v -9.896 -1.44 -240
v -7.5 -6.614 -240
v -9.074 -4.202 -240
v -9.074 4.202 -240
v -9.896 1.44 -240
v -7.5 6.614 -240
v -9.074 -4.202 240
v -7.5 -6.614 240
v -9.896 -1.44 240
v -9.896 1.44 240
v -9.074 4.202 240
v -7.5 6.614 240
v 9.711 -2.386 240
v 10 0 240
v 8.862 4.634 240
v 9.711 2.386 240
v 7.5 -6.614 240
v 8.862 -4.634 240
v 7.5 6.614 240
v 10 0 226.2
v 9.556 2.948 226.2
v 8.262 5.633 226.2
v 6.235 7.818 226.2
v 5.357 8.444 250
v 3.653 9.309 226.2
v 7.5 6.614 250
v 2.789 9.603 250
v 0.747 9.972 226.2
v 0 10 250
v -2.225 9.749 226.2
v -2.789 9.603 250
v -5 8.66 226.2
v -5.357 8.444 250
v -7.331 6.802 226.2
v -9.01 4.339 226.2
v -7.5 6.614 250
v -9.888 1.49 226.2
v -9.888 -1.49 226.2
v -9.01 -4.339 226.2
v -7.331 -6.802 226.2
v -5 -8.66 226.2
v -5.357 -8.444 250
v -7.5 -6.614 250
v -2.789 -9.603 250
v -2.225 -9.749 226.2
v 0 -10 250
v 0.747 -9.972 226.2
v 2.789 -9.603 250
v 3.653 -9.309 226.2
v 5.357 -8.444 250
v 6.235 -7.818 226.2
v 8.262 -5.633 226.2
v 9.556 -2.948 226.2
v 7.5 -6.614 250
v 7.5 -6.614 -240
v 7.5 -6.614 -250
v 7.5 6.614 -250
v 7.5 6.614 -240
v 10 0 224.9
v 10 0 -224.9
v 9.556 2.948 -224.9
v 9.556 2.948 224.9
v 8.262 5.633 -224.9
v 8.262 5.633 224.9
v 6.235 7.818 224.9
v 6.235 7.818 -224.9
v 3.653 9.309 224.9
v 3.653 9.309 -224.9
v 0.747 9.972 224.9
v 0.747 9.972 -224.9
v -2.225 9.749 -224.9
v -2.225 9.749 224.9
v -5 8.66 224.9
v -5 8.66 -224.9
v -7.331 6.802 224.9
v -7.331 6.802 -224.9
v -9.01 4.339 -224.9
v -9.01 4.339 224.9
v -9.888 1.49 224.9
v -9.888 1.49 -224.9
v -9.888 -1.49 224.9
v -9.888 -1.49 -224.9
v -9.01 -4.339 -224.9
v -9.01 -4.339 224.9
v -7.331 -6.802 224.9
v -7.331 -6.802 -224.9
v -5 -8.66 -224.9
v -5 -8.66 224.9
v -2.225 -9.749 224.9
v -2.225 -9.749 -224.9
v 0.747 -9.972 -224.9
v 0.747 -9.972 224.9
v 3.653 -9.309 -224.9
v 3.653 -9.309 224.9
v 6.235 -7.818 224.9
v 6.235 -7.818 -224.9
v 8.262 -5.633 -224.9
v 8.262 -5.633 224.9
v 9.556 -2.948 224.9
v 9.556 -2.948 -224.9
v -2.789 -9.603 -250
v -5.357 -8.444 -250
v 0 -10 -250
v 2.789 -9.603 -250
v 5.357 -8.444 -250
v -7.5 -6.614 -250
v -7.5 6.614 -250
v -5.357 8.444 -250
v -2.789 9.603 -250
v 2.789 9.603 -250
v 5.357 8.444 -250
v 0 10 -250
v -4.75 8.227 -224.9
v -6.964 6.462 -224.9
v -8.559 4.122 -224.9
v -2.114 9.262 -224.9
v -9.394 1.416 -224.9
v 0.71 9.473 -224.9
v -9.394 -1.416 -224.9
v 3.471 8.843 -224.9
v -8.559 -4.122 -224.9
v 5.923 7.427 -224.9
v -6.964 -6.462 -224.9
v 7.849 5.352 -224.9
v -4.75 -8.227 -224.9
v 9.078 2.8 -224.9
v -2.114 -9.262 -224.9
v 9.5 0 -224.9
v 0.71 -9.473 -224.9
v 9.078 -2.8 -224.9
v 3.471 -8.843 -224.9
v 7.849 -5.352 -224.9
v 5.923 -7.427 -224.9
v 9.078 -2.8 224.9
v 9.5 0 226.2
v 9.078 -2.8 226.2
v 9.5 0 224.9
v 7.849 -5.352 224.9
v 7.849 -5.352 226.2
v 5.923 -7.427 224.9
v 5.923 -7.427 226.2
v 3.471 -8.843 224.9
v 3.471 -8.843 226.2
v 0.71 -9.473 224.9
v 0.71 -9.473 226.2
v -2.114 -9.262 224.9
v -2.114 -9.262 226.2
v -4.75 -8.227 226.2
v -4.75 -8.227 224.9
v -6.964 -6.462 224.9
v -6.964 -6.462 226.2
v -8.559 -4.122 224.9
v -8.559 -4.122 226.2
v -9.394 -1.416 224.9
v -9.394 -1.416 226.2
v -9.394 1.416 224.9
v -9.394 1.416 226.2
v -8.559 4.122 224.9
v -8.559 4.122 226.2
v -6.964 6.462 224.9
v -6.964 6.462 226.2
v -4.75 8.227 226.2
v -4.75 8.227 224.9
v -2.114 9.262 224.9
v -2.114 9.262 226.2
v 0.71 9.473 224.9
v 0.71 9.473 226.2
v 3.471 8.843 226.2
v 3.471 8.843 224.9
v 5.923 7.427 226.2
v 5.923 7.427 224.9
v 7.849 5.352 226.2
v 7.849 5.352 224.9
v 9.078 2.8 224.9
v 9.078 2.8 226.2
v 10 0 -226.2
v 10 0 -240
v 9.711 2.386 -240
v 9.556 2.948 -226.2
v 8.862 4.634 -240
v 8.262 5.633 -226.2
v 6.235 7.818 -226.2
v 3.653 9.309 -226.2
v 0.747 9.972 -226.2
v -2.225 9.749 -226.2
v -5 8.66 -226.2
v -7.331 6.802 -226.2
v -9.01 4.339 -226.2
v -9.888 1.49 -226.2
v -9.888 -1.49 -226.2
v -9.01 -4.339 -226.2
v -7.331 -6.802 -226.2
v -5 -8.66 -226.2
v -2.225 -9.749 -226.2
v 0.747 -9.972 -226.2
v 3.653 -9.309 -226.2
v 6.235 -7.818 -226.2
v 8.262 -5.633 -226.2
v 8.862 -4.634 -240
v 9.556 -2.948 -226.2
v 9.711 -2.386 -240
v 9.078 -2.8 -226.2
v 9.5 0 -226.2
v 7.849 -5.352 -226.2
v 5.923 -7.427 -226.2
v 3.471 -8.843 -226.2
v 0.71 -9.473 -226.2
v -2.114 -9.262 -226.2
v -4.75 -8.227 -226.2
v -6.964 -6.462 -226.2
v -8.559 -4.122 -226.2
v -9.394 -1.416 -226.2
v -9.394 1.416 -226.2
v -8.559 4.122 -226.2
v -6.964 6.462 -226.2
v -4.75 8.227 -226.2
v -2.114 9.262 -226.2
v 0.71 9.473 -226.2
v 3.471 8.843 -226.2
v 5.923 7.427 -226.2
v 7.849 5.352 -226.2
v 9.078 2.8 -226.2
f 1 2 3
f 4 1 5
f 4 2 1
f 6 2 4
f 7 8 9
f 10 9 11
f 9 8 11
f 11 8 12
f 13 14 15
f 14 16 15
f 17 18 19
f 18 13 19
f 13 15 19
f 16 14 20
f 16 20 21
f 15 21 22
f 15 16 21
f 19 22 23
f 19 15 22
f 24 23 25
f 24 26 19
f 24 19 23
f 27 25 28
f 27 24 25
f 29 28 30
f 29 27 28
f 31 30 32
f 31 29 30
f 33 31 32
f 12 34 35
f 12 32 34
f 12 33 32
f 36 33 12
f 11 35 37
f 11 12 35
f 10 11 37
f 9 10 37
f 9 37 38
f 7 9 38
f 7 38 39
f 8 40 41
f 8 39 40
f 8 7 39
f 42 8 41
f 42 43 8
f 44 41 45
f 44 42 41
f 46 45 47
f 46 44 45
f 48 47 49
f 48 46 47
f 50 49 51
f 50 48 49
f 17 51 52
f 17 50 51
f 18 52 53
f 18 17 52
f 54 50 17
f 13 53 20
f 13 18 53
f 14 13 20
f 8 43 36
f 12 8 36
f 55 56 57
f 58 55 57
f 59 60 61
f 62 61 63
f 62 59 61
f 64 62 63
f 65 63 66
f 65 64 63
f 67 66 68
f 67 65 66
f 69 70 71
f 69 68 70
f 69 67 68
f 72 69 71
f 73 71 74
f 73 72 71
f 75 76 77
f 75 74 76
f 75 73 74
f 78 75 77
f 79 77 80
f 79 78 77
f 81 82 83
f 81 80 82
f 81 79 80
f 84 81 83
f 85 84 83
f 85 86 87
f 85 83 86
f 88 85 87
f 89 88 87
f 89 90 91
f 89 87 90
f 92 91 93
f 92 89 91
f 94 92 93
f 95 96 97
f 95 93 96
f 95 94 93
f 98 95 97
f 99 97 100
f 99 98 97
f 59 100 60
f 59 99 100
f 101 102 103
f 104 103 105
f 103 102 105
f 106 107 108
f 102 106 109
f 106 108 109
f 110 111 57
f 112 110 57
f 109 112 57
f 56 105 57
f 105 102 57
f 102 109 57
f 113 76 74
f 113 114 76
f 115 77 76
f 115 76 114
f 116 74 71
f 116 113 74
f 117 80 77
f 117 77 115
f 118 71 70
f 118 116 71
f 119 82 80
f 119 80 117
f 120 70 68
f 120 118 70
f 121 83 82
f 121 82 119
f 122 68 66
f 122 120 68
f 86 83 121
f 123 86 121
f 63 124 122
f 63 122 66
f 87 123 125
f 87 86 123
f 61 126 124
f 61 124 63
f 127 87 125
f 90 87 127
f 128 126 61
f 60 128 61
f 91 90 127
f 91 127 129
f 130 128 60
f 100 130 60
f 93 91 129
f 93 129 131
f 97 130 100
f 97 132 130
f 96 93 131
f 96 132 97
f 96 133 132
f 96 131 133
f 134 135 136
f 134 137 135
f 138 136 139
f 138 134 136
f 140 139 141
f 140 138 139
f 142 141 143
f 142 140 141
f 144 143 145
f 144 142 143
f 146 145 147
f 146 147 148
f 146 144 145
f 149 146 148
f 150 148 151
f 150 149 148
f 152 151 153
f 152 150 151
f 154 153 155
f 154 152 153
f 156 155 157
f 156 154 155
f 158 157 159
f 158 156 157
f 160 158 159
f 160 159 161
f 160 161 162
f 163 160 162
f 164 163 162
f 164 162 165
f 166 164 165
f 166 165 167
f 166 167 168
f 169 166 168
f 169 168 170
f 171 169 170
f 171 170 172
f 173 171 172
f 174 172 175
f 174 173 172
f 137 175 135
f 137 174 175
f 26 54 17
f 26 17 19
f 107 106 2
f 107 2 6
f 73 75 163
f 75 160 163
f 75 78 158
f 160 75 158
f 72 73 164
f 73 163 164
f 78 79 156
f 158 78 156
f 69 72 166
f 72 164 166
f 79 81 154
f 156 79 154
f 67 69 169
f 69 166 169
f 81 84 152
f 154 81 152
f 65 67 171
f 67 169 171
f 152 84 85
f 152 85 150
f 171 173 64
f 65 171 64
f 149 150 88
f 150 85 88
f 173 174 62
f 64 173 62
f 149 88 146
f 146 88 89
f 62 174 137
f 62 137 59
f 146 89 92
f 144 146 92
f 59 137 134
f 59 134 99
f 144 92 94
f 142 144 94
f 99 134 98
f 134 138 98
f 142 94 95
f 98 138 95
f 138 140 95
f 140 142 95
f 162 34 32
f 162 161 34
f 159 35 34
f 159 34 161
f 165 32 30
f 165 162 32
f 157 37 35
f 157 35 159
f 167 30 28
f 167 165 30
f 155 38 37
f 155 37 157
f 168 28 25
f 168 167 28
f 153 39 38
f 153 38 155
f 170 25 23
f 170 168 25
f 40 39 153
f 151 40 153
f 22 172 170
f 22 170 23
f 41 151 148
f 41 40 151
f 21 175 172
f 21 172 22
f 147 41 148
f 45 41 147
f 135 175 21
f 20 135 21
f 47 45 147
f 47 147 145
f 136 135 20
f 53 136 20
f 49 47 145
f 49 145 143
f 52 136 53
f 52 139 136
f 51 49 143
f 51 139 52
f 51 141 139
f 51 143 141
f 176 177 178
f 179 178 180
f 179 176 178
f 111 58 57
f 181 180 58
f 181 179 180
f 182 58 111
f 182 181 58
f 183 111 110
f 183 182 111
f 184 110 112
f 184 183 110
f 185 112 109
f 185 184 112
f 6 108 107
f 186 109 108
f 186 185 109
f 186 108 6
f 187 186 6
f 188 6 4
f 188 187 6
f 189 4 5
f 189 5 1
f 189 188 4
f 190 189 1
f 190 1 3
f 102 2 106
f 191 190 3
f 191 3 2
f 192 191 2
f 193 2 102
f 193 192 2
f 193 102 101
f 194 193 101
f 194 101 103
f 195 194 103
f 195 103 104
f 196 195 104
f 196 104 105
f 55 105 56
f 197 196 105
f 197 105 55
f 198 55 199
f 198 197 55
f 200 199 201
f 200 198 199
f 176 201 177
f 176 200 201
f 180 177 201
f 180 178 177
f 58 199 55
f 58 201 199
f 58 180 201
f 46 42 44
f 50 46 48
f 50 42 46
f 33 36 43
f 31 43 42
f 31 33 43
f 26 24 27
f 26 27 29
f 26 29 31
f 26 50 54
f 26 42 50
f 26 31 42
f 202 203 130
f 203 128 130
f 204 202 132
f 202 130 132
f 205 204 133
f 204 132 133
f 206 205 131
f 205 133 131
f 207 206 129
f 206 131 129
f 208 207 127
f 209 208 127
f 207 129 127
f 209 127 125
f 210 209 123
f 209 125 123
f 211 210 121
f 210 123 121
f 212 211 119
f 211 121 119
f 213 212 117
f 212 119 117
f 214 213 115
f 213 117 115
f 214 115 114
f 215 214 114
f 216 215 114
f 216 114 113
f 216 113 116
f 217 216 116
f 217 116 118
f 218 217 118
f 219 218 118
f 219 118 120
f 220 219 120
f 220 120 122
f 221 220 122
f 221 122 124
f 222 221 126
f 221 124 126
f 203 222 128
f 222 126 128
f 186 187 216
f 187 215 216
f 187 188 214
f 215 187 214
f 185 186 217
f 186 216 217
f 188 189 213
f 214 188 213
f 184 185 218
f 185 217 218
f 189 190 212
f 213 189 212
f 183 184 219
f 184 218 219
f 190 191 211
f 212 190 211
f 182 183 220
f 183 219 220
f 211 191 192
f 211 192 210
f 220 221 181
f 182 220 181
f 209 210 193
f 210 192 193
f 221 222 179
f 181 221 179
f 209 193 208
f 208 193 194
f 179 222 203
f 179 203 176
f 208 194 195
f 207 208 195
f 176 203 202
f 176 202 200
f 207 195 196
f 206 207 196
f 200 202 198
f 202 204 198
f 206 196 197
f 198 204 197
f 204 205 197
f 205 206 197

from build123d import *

# Parameters (mm, degrees)
SKETCH_1_R           = 10
EXTRUDE_1_DEPTH      = 250
SKETCH_3_W           = 1.3
SKETCH_3_H           = 0.5
SKETCH_4_OUTSIDE_W   = 122.16
SKETCH_4_OUTSIDE_H   = 122.16
SKETCH_4_OUTSIDE_W_2 = 15
SKETCH_4_OUTSIDE_H_2 = 51.001115416
CUT_EXTRUDE_1_DEPTH  = 10


with BuildPart() as part:
    # 草图1 → 凸台-拉伸1 (new, symmetric)
    with BuildSketch(Plane.XY):
        Circle(SKETCH_1_R)
    extrude(amount=EXTRUDE_1_DEPTH, both=True)

    # 草图3 → 切除-旋转1 (revolve, cut)
    with BuildSketch(Plane(origin=(100, 0, 250), x_dir=(0, 0, -1), z_dir=(0, 1, 0))):
        with Locations((24.45, 90.25)):
            Rectangle(SKETCH_3_W, SKETCH_3_H)
    cut_revolve_1 = revolve(axis=Axis((0, 0, 250), (0, 0, -1)), mode=Mode.SUBTRACT)

    # 草图4 outside → 切除-拉伸1 (cut)
    with BuildSketch(Plane(origin=(0, 0, -250), x_dir=(-1, 0, 0), z_dir=(0, 0, -1))):
        Rectangle(SKETCH_4_OUTSIDE_W, SKETCH_4_OUTSIDE_H)
        Rectangle(SKETCH_4_OUTSIDE_W_2, SKETCH_4_OUTSIDE_H_2, mode=Mode.SUBTRACT)
    cut_extrude_1 = extrude(amount=-CUT_EXTRUDE_1_DEPTH, mode=Mode.SUBTRACT)

    # 镜向1: 切除-旋转1, 切除-拉伸1 across plane
    add(cut_revolve_1.mirror(Plane.XY), mode=Mode.SUBTRACT)
    add(cut_extrude_1.mirror(Plane.XY), mode=Mode.SUBTRACT)


solid = part.part
